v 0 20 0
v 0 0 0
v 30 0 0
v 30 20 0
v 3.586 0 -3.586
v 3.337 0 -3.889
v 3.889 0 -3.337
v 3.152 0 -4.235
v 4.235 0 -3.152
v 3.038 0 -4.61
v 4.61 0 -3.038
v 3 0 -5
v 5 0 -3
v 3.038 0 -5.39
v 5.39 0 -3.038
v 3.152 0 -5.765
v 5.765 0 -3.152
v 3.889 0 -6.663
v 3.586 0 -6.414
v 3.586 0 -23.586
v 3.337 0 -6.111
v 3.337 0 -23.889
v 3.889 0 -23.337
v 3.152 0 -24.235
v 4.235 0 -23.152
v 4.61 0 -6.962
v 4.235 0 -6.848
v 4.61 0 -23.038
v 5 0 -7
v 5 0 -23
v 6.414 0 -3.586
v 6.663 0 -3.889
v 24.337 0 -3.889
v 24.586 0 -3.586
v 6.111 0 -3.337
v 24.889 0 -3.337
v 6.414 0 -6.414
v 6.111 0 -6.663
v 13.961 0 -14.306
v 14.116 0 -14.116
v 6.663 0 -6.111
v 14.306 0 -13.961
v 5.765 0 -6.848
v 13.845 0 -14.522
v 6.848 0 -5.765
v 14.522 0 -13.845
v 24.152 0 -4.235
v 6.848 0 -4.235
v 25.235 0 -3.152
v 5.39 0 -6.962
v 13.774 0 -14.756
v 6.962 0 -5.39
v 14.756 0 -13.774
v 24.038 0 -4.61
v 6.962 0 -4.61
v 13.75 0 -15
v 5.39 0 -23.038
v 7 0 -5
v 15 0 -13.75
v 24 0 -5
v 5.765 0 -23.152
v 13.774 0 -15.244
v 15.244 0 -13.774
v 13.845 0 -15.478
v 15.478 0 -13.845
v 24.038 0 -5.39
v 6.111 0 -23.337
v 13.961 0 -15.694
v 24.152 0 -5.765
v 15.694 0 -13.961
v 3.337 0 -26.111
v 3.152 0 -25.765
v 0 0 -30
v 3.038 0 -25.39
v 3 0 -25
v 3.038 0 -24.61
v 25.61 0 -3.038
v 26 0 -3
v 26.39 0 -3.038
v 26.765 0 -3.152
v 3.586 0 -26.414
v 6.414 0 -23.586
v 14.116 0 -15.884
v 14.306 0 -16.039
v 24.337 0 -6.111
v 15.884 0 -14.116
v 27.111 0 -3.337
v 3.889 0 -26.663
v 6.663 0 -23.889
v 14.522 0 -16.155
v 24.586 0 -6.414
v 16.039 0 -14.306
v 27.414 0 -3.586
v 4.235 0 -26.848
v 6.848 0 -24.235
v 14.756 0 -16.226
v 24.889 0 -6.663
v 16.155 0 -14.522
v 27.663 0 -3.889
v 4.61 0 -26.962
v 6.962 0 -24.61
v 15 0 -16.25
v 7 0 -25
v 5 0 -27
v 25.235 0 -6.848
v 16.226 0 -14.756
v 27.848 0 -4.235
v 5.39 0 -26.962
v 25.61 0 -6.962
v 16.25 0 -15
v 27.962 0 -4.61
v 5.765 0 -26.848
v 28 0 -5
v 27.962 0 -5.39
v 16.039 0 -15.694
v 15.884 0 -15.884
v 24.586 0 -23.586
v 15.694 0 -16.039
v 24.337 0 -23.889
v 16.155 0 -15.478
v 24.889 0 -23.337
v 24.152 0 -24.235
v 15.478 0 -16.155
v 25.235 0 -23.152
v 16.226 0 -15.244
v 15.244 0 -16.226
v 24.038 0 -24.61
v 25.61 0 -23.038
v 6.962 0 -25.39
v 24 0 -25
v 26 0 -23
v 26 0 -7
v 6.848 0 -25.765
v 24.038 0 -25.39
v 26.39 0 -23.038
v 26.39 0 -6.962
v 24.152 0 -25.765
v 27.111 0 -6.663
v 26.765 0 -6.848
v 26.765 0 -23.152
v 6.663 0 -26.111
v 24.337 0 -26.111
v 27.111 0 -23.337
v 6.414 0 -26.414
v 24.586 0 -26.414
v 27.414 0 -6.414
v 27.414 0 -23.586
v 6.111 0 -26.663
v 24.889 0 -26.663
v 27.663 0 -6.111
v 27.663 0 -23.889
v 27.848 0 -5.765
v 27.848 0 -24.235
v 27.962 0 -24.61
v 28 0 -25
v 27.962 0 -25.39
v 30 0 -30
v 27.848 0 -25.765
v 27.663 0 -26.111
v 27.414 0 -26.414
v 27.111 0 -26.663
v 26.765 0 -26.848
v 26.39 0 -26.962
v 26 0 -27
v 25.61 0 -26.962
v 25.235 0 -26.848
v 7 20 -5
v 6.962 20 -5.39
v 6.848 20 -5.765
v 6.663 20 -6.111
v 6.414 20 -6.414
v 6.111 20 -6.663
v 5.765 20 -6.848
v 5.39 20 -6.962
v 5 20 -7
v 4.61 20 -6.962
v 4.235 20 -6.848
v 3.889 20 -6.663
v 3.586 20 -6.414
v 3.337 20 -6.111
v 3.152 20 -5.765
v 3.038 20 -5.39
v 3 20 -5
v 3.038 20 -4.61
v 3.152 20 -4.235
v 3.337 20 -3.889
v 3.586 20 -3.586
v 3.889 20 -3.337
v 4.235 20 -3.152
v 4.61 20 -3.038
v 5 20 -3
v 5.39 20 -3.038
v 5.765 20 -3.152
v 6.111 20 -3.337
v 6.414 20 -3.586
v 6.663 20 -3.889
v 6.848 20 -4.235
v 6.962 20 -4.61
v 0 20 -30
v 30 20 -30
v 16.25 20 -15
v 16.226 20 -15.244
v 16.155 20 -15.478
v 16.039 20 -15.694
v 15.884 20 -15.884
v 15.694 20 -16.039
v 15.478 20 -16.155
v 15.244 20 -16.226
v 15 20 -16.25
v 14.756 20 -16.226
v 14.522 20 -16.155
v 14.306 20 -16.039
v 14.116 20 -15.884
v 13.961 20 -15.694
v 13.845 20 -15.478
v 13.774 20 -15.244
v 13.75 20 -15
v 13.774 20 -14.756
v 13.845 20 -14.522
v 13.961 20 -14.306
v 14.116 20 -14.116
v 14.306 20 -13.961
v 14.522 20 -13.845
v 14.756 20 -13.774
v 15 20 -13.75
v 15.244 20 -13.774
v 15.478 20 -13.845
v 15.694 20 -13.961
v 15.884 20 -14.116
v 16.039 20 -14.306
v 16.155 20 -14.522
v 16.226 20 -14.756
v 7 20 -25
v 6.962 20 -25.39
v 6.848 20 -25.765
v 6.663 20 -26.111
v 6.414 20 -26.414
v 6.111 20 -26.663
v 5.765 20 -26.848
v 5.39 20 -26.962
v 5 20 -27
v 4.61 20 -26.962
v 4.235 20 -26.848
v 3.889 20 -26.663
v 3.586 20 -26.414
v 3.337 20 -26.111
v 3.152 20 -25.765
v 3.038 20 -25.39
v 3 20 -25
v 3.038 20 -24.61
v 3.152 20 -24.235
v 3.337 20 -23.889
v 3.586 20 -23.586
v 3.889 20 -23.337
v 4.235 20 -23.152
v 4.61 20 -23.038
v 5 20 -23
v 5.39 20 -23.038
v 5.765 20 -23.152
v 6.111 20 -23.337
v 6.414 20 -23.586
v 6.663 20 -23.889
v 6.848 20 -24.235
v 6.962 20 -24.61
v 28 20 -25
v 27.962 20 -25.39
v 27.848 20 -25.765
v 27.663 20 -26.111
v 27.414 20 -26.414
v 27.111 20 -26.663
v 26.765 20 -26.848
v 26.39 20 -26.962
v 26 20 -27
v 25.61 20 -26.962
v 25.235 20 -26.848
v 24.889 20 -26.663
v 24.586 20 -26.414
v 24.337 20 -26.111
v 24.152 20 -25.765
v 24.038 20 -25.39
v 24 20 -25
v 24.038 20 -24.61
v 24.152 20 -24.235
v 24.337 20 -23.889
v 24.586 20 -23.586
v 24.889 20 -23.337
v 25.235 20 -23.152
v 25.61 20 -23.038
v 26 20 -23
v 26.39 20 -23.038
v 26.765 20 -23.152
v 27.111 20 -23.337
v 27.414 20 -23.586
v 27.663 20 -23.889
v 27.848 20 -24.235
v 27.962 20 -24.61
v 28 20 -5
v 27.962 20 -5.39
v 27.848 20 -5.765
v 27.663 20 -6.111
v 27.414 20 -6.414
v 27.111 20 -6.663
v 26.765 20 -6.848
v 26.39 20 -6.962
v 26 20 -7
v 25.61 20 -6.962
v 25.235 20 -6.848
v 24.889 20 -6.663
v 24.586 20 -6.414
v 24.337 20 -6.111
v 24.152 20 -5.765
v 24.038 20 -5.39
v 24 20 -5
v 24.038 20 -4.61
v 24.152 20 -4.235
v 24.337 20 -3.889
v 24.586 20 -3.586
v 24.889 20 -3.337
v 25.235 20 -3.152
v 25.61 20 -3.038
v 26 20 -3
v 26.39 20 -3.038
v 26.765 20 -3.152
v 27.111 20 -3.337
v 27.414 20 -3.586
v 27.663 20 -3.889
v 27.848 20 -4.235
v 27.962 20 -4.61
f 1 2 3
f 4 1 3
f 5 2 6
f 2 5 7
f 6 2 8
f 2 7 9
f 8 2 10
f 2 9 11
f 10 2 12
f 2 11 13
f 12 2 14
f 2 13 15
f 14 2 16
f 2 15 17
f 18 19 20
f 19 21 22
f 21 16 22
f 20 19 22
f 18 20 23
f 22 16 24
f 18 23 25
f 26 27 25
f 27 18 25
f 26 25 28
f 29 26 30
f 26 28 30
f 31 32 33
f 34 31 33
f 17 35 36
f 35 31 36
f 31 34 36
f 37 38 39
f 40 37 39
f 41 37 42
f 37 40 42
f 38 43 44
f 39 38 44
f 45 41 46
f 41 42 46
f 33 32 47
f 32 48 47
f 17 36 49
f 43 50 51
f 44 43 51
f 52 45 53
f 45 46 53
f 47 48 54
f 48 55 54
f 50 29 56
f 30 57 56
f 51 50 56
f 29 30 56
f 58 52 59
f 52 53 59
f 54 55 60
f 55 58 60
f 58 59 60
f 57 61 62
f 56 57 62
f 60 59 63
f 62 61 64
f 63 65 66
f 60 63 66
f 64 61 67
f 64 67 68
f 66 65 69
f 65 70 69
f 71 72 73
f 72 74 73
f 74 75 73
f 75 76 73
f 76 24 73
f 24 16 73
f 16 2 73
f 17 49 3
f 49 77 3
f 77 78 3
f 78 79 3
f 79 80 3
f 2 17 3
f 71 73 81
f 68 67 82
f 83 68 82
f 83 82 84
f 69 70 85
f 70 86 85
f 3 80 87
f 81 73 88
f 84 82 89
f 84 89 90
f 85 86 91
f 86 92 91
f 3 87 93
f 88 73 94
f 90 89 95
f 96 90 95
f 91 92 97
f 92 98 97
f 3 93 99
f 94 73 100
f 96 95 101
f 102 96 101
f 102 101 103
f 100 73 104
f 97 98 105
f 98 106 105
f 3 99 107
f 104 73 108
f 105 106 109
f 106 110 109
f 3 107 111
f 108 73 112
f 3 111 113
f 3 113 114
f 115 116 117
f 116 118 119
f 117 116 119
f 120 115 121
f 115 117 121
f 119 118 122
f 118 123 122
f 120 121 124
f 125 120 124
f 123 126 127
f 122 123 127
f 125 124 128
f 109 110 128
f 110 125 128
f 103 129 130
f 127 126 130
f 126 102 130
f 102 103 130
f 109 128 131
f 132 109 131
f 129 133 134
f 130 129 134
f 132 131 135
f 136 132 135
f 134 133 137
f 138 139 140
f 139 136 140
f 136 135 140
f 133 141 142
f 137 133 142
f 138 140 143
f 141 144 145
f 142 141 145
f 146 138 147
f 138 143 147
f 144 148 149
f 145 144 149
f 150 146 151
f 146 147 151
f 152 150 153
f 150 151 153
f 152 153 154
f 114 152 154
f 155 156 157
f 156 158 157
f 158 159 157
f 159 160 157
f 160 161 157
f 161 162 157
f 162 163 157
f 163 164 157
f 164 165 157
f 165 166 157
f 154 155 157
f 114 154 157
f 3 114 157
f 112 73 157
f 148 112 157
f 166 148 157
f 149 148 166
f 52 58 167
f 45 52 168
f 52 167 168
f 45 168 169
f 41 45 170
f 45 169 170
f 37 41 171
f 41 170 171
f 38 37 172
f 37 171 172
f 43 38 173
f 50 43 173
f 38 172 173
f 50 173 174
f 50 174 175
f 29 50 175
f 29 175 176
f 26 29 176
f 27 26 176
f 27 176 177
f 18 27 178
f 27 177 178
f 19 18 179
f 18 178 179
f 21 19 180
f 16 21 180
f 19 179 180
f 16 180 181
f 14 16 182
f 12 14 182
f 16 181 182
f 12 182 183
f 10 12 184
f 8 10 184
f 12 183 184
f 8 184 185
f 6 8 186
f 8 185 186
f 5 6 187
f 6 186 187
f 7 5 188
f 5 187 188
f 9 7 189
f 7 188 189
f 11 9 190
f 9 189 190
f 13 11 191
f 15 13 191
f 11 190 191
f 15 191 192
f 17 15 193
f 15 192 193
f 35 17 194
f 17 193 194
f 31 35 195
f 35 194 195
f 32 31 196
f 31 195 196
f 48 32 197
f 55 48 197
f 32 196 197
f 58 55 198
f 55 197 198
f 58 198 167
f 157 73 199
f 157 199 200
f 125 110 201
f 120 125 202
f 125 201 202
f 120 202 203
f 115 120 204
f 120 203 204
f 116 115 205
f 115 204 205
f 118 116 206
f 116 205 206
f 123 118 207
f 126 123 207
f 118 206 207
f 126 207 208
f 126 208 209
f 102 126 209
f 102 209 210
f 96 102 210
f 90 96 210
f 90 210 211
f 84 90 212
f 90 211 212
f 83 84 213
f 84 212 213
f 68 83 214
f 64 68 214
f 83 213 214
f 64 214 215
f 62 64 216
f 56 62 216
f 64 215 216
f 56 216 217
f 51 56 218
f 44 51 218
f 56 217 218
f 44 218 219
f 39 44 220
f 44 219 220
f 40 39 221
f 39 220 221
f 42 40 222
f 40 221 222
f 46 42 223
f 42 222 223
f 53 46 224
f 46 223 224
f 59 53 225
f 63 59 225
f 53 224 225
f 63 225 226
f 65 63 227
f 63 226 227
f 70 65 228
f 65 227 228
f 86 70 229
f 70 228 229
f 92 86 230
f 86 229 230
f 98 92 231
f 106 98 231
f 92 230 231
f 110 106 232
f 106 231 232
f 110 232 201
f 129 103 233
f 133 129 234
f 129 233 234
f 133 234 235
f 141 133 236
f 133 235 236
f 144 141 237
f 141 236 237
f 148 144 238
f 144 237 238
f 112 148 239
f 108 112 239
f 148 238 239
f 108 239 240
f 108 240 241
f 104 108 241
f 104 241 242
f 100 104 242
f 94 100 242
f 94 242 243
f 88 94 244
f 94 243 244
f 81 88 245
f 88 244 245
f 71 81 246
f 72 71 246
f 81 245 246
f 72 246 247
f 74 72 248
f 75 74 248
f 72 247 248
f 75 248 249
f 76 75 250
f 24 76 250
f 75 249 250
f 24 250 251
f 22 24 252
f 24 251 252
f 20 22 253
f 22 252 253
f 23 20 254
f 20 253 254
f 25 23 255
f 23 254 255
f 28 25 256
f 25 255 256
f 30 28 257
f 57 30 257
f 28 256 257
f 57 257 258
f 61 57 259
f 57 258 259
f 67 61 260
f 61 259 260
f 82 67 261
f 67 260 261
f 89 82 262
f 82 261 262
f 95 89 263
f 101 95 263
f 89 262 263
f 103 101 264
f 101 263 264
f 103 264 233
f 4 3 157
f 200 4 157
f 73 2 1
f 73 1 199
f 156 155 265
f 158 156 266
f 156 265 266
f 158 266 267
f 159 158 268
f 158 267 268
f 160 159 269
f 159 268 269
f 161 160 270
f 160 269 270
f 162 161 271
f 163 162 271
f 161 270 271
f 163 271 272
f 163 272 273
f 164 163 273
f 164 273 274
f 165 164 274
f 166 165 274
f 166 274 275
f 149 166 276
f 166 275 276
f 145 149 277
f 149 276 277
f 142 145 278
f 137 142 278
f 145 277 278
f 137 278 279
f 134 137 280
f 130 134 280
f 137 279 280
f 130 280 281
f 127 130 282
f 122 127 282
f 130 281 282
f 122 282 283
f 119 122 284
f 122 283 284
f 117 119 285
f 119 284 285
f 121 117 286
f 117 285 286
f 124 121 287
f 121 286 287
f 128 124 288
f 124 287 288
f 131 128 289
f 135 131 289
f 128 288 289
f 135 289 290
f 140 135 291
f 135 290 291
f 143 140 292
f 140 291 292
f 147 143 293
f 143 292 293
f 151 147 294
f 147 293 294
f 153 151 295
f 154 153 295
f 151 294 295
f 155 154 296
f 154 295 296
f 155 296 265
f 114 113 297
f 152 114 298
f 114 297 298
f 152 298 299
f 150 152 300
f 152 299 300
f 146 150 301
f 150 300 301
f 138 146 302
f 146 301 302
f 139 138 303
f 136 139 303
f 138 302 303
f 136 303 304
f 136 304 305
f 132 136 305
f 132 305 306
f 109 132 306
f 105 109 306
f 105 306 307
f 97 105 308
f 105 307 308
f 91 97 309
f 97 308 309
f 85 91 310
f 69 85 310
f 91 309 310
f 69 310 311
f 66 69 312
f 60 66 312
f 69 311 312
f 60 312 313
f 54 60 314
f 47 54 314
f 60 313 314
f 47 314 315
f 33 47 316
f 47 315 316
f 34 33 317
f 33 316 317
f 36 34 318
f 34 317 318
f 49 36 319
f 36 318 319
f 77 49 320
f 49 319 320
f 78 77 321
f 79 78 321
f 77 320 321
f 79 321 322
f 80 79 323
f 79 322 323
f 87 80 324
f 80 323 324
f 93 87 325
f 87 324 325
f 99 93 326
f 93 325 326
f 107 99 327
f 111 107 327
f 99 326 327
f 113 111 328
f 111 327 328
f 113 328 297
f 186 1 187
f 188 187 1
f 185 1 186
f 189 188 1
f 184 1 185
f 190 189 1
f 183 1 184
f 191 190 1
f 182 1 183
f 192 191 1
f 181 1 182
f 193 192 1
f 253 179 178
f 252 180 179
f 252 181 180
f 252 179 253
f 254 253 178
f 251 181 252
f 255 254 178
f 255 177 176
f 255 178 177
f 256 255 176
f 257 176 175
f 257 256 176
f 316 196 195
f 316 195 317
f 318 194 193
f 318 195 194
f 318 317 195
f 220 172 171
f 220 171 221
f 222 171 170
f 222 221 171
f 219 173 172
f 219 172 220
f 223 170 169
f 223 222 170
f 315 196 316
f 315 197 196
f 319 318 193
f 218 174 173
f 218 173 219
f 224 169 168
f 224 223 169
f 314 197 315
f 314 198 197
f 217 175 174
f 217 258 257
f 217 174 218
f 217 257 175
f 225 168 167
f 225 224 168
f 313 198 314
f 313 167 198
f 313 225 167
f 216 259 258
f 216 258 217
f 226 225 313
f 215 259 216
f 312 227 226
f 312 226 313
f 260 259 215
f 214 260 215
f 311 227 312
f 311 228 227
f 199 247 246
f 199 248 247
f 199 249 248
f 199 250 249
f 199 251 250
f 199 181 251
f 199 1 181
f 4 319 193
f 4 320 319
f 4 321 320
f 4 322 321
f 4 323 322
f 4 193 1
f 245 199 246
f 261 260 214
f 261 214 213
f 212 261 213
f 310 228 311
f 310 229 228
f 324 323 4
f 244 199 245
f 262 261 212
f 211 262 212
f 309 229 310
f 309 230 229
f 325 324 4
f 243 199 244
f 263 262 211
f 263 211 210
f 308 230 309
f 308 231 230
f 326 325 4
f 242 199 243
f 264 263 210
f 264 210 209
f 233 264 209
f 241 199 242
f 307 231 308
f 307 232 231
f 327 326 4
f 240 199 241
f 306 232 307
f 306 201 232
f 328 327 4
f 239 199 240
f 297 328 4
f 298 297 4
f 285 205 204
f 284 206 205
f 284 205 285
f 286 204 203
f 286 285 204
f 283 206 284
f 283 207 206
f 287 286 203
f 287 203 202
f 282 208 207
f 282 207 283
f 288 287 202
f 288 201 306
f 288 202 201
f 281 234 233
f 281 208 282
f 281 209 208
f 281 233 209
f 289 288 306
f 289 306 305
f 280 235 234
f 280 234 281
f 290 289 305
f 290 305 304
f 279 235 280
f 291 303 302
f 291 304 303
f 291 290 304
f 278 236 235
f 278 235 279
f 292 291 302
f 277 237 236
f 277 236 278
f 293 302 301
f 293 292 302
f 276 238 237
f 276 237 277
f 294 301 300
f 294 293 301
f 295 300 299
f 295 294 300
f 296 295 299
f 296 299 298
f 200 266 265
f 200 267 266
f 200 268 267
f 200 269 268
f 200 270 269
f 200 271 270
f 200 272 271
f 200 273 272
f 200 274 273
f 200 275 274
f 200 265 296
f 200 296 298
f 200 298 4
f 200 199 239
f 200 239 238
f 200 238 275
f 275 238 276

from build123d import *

# Parameters (mm, degrees)
SKETCH1_W           = 30
SKETCH1_H           = 30
BOSS_EXTRUDE1_DEPTH = 20
SKETCH2_R           = 2
SKETCH2_R_2         = 1.25
CUT_EXTRUDE1_DEPTH  = 20


with BuildPart() as part:
    # Sketch1 → Boss-Extrude1 (new body)
    with BuildSketch(Plane(origin=(0, 0, 0), x_dir=(1, 0, 0), z_dir=(0, 1, 0))):
        with Locations((15, 15)):
            Rectangle(SKETCH1_W, SKETCH1_H)
    extrude(amount=BOSS_EXTRUDE1_DEPTH)

    # Sketch2 → Cut-Extrude1 (cut)
    with BuildSketch(Plane(origin=(0, 20, 0), x_dir=(1, 0, 0), z_dir=(0, 1, 0))):
        with Locations((5, 25)):
            Circle(SKETCH2_R)
        with Locations((5, 5)):
            Circle(SKETCH2_R)
        with Locations((26, 5)):
            Circle(SKETCH2_R)
        with Locations((26, 25)):
            Circle(SKETCH2_R)
        with Locations((15, 15)):
            Circle(SKETCH2_R_2)
    extrude(amount=-CUT_EXTRUDE1_DEPTH, mode=Mode.SUBTRACT)


solid = part.part
